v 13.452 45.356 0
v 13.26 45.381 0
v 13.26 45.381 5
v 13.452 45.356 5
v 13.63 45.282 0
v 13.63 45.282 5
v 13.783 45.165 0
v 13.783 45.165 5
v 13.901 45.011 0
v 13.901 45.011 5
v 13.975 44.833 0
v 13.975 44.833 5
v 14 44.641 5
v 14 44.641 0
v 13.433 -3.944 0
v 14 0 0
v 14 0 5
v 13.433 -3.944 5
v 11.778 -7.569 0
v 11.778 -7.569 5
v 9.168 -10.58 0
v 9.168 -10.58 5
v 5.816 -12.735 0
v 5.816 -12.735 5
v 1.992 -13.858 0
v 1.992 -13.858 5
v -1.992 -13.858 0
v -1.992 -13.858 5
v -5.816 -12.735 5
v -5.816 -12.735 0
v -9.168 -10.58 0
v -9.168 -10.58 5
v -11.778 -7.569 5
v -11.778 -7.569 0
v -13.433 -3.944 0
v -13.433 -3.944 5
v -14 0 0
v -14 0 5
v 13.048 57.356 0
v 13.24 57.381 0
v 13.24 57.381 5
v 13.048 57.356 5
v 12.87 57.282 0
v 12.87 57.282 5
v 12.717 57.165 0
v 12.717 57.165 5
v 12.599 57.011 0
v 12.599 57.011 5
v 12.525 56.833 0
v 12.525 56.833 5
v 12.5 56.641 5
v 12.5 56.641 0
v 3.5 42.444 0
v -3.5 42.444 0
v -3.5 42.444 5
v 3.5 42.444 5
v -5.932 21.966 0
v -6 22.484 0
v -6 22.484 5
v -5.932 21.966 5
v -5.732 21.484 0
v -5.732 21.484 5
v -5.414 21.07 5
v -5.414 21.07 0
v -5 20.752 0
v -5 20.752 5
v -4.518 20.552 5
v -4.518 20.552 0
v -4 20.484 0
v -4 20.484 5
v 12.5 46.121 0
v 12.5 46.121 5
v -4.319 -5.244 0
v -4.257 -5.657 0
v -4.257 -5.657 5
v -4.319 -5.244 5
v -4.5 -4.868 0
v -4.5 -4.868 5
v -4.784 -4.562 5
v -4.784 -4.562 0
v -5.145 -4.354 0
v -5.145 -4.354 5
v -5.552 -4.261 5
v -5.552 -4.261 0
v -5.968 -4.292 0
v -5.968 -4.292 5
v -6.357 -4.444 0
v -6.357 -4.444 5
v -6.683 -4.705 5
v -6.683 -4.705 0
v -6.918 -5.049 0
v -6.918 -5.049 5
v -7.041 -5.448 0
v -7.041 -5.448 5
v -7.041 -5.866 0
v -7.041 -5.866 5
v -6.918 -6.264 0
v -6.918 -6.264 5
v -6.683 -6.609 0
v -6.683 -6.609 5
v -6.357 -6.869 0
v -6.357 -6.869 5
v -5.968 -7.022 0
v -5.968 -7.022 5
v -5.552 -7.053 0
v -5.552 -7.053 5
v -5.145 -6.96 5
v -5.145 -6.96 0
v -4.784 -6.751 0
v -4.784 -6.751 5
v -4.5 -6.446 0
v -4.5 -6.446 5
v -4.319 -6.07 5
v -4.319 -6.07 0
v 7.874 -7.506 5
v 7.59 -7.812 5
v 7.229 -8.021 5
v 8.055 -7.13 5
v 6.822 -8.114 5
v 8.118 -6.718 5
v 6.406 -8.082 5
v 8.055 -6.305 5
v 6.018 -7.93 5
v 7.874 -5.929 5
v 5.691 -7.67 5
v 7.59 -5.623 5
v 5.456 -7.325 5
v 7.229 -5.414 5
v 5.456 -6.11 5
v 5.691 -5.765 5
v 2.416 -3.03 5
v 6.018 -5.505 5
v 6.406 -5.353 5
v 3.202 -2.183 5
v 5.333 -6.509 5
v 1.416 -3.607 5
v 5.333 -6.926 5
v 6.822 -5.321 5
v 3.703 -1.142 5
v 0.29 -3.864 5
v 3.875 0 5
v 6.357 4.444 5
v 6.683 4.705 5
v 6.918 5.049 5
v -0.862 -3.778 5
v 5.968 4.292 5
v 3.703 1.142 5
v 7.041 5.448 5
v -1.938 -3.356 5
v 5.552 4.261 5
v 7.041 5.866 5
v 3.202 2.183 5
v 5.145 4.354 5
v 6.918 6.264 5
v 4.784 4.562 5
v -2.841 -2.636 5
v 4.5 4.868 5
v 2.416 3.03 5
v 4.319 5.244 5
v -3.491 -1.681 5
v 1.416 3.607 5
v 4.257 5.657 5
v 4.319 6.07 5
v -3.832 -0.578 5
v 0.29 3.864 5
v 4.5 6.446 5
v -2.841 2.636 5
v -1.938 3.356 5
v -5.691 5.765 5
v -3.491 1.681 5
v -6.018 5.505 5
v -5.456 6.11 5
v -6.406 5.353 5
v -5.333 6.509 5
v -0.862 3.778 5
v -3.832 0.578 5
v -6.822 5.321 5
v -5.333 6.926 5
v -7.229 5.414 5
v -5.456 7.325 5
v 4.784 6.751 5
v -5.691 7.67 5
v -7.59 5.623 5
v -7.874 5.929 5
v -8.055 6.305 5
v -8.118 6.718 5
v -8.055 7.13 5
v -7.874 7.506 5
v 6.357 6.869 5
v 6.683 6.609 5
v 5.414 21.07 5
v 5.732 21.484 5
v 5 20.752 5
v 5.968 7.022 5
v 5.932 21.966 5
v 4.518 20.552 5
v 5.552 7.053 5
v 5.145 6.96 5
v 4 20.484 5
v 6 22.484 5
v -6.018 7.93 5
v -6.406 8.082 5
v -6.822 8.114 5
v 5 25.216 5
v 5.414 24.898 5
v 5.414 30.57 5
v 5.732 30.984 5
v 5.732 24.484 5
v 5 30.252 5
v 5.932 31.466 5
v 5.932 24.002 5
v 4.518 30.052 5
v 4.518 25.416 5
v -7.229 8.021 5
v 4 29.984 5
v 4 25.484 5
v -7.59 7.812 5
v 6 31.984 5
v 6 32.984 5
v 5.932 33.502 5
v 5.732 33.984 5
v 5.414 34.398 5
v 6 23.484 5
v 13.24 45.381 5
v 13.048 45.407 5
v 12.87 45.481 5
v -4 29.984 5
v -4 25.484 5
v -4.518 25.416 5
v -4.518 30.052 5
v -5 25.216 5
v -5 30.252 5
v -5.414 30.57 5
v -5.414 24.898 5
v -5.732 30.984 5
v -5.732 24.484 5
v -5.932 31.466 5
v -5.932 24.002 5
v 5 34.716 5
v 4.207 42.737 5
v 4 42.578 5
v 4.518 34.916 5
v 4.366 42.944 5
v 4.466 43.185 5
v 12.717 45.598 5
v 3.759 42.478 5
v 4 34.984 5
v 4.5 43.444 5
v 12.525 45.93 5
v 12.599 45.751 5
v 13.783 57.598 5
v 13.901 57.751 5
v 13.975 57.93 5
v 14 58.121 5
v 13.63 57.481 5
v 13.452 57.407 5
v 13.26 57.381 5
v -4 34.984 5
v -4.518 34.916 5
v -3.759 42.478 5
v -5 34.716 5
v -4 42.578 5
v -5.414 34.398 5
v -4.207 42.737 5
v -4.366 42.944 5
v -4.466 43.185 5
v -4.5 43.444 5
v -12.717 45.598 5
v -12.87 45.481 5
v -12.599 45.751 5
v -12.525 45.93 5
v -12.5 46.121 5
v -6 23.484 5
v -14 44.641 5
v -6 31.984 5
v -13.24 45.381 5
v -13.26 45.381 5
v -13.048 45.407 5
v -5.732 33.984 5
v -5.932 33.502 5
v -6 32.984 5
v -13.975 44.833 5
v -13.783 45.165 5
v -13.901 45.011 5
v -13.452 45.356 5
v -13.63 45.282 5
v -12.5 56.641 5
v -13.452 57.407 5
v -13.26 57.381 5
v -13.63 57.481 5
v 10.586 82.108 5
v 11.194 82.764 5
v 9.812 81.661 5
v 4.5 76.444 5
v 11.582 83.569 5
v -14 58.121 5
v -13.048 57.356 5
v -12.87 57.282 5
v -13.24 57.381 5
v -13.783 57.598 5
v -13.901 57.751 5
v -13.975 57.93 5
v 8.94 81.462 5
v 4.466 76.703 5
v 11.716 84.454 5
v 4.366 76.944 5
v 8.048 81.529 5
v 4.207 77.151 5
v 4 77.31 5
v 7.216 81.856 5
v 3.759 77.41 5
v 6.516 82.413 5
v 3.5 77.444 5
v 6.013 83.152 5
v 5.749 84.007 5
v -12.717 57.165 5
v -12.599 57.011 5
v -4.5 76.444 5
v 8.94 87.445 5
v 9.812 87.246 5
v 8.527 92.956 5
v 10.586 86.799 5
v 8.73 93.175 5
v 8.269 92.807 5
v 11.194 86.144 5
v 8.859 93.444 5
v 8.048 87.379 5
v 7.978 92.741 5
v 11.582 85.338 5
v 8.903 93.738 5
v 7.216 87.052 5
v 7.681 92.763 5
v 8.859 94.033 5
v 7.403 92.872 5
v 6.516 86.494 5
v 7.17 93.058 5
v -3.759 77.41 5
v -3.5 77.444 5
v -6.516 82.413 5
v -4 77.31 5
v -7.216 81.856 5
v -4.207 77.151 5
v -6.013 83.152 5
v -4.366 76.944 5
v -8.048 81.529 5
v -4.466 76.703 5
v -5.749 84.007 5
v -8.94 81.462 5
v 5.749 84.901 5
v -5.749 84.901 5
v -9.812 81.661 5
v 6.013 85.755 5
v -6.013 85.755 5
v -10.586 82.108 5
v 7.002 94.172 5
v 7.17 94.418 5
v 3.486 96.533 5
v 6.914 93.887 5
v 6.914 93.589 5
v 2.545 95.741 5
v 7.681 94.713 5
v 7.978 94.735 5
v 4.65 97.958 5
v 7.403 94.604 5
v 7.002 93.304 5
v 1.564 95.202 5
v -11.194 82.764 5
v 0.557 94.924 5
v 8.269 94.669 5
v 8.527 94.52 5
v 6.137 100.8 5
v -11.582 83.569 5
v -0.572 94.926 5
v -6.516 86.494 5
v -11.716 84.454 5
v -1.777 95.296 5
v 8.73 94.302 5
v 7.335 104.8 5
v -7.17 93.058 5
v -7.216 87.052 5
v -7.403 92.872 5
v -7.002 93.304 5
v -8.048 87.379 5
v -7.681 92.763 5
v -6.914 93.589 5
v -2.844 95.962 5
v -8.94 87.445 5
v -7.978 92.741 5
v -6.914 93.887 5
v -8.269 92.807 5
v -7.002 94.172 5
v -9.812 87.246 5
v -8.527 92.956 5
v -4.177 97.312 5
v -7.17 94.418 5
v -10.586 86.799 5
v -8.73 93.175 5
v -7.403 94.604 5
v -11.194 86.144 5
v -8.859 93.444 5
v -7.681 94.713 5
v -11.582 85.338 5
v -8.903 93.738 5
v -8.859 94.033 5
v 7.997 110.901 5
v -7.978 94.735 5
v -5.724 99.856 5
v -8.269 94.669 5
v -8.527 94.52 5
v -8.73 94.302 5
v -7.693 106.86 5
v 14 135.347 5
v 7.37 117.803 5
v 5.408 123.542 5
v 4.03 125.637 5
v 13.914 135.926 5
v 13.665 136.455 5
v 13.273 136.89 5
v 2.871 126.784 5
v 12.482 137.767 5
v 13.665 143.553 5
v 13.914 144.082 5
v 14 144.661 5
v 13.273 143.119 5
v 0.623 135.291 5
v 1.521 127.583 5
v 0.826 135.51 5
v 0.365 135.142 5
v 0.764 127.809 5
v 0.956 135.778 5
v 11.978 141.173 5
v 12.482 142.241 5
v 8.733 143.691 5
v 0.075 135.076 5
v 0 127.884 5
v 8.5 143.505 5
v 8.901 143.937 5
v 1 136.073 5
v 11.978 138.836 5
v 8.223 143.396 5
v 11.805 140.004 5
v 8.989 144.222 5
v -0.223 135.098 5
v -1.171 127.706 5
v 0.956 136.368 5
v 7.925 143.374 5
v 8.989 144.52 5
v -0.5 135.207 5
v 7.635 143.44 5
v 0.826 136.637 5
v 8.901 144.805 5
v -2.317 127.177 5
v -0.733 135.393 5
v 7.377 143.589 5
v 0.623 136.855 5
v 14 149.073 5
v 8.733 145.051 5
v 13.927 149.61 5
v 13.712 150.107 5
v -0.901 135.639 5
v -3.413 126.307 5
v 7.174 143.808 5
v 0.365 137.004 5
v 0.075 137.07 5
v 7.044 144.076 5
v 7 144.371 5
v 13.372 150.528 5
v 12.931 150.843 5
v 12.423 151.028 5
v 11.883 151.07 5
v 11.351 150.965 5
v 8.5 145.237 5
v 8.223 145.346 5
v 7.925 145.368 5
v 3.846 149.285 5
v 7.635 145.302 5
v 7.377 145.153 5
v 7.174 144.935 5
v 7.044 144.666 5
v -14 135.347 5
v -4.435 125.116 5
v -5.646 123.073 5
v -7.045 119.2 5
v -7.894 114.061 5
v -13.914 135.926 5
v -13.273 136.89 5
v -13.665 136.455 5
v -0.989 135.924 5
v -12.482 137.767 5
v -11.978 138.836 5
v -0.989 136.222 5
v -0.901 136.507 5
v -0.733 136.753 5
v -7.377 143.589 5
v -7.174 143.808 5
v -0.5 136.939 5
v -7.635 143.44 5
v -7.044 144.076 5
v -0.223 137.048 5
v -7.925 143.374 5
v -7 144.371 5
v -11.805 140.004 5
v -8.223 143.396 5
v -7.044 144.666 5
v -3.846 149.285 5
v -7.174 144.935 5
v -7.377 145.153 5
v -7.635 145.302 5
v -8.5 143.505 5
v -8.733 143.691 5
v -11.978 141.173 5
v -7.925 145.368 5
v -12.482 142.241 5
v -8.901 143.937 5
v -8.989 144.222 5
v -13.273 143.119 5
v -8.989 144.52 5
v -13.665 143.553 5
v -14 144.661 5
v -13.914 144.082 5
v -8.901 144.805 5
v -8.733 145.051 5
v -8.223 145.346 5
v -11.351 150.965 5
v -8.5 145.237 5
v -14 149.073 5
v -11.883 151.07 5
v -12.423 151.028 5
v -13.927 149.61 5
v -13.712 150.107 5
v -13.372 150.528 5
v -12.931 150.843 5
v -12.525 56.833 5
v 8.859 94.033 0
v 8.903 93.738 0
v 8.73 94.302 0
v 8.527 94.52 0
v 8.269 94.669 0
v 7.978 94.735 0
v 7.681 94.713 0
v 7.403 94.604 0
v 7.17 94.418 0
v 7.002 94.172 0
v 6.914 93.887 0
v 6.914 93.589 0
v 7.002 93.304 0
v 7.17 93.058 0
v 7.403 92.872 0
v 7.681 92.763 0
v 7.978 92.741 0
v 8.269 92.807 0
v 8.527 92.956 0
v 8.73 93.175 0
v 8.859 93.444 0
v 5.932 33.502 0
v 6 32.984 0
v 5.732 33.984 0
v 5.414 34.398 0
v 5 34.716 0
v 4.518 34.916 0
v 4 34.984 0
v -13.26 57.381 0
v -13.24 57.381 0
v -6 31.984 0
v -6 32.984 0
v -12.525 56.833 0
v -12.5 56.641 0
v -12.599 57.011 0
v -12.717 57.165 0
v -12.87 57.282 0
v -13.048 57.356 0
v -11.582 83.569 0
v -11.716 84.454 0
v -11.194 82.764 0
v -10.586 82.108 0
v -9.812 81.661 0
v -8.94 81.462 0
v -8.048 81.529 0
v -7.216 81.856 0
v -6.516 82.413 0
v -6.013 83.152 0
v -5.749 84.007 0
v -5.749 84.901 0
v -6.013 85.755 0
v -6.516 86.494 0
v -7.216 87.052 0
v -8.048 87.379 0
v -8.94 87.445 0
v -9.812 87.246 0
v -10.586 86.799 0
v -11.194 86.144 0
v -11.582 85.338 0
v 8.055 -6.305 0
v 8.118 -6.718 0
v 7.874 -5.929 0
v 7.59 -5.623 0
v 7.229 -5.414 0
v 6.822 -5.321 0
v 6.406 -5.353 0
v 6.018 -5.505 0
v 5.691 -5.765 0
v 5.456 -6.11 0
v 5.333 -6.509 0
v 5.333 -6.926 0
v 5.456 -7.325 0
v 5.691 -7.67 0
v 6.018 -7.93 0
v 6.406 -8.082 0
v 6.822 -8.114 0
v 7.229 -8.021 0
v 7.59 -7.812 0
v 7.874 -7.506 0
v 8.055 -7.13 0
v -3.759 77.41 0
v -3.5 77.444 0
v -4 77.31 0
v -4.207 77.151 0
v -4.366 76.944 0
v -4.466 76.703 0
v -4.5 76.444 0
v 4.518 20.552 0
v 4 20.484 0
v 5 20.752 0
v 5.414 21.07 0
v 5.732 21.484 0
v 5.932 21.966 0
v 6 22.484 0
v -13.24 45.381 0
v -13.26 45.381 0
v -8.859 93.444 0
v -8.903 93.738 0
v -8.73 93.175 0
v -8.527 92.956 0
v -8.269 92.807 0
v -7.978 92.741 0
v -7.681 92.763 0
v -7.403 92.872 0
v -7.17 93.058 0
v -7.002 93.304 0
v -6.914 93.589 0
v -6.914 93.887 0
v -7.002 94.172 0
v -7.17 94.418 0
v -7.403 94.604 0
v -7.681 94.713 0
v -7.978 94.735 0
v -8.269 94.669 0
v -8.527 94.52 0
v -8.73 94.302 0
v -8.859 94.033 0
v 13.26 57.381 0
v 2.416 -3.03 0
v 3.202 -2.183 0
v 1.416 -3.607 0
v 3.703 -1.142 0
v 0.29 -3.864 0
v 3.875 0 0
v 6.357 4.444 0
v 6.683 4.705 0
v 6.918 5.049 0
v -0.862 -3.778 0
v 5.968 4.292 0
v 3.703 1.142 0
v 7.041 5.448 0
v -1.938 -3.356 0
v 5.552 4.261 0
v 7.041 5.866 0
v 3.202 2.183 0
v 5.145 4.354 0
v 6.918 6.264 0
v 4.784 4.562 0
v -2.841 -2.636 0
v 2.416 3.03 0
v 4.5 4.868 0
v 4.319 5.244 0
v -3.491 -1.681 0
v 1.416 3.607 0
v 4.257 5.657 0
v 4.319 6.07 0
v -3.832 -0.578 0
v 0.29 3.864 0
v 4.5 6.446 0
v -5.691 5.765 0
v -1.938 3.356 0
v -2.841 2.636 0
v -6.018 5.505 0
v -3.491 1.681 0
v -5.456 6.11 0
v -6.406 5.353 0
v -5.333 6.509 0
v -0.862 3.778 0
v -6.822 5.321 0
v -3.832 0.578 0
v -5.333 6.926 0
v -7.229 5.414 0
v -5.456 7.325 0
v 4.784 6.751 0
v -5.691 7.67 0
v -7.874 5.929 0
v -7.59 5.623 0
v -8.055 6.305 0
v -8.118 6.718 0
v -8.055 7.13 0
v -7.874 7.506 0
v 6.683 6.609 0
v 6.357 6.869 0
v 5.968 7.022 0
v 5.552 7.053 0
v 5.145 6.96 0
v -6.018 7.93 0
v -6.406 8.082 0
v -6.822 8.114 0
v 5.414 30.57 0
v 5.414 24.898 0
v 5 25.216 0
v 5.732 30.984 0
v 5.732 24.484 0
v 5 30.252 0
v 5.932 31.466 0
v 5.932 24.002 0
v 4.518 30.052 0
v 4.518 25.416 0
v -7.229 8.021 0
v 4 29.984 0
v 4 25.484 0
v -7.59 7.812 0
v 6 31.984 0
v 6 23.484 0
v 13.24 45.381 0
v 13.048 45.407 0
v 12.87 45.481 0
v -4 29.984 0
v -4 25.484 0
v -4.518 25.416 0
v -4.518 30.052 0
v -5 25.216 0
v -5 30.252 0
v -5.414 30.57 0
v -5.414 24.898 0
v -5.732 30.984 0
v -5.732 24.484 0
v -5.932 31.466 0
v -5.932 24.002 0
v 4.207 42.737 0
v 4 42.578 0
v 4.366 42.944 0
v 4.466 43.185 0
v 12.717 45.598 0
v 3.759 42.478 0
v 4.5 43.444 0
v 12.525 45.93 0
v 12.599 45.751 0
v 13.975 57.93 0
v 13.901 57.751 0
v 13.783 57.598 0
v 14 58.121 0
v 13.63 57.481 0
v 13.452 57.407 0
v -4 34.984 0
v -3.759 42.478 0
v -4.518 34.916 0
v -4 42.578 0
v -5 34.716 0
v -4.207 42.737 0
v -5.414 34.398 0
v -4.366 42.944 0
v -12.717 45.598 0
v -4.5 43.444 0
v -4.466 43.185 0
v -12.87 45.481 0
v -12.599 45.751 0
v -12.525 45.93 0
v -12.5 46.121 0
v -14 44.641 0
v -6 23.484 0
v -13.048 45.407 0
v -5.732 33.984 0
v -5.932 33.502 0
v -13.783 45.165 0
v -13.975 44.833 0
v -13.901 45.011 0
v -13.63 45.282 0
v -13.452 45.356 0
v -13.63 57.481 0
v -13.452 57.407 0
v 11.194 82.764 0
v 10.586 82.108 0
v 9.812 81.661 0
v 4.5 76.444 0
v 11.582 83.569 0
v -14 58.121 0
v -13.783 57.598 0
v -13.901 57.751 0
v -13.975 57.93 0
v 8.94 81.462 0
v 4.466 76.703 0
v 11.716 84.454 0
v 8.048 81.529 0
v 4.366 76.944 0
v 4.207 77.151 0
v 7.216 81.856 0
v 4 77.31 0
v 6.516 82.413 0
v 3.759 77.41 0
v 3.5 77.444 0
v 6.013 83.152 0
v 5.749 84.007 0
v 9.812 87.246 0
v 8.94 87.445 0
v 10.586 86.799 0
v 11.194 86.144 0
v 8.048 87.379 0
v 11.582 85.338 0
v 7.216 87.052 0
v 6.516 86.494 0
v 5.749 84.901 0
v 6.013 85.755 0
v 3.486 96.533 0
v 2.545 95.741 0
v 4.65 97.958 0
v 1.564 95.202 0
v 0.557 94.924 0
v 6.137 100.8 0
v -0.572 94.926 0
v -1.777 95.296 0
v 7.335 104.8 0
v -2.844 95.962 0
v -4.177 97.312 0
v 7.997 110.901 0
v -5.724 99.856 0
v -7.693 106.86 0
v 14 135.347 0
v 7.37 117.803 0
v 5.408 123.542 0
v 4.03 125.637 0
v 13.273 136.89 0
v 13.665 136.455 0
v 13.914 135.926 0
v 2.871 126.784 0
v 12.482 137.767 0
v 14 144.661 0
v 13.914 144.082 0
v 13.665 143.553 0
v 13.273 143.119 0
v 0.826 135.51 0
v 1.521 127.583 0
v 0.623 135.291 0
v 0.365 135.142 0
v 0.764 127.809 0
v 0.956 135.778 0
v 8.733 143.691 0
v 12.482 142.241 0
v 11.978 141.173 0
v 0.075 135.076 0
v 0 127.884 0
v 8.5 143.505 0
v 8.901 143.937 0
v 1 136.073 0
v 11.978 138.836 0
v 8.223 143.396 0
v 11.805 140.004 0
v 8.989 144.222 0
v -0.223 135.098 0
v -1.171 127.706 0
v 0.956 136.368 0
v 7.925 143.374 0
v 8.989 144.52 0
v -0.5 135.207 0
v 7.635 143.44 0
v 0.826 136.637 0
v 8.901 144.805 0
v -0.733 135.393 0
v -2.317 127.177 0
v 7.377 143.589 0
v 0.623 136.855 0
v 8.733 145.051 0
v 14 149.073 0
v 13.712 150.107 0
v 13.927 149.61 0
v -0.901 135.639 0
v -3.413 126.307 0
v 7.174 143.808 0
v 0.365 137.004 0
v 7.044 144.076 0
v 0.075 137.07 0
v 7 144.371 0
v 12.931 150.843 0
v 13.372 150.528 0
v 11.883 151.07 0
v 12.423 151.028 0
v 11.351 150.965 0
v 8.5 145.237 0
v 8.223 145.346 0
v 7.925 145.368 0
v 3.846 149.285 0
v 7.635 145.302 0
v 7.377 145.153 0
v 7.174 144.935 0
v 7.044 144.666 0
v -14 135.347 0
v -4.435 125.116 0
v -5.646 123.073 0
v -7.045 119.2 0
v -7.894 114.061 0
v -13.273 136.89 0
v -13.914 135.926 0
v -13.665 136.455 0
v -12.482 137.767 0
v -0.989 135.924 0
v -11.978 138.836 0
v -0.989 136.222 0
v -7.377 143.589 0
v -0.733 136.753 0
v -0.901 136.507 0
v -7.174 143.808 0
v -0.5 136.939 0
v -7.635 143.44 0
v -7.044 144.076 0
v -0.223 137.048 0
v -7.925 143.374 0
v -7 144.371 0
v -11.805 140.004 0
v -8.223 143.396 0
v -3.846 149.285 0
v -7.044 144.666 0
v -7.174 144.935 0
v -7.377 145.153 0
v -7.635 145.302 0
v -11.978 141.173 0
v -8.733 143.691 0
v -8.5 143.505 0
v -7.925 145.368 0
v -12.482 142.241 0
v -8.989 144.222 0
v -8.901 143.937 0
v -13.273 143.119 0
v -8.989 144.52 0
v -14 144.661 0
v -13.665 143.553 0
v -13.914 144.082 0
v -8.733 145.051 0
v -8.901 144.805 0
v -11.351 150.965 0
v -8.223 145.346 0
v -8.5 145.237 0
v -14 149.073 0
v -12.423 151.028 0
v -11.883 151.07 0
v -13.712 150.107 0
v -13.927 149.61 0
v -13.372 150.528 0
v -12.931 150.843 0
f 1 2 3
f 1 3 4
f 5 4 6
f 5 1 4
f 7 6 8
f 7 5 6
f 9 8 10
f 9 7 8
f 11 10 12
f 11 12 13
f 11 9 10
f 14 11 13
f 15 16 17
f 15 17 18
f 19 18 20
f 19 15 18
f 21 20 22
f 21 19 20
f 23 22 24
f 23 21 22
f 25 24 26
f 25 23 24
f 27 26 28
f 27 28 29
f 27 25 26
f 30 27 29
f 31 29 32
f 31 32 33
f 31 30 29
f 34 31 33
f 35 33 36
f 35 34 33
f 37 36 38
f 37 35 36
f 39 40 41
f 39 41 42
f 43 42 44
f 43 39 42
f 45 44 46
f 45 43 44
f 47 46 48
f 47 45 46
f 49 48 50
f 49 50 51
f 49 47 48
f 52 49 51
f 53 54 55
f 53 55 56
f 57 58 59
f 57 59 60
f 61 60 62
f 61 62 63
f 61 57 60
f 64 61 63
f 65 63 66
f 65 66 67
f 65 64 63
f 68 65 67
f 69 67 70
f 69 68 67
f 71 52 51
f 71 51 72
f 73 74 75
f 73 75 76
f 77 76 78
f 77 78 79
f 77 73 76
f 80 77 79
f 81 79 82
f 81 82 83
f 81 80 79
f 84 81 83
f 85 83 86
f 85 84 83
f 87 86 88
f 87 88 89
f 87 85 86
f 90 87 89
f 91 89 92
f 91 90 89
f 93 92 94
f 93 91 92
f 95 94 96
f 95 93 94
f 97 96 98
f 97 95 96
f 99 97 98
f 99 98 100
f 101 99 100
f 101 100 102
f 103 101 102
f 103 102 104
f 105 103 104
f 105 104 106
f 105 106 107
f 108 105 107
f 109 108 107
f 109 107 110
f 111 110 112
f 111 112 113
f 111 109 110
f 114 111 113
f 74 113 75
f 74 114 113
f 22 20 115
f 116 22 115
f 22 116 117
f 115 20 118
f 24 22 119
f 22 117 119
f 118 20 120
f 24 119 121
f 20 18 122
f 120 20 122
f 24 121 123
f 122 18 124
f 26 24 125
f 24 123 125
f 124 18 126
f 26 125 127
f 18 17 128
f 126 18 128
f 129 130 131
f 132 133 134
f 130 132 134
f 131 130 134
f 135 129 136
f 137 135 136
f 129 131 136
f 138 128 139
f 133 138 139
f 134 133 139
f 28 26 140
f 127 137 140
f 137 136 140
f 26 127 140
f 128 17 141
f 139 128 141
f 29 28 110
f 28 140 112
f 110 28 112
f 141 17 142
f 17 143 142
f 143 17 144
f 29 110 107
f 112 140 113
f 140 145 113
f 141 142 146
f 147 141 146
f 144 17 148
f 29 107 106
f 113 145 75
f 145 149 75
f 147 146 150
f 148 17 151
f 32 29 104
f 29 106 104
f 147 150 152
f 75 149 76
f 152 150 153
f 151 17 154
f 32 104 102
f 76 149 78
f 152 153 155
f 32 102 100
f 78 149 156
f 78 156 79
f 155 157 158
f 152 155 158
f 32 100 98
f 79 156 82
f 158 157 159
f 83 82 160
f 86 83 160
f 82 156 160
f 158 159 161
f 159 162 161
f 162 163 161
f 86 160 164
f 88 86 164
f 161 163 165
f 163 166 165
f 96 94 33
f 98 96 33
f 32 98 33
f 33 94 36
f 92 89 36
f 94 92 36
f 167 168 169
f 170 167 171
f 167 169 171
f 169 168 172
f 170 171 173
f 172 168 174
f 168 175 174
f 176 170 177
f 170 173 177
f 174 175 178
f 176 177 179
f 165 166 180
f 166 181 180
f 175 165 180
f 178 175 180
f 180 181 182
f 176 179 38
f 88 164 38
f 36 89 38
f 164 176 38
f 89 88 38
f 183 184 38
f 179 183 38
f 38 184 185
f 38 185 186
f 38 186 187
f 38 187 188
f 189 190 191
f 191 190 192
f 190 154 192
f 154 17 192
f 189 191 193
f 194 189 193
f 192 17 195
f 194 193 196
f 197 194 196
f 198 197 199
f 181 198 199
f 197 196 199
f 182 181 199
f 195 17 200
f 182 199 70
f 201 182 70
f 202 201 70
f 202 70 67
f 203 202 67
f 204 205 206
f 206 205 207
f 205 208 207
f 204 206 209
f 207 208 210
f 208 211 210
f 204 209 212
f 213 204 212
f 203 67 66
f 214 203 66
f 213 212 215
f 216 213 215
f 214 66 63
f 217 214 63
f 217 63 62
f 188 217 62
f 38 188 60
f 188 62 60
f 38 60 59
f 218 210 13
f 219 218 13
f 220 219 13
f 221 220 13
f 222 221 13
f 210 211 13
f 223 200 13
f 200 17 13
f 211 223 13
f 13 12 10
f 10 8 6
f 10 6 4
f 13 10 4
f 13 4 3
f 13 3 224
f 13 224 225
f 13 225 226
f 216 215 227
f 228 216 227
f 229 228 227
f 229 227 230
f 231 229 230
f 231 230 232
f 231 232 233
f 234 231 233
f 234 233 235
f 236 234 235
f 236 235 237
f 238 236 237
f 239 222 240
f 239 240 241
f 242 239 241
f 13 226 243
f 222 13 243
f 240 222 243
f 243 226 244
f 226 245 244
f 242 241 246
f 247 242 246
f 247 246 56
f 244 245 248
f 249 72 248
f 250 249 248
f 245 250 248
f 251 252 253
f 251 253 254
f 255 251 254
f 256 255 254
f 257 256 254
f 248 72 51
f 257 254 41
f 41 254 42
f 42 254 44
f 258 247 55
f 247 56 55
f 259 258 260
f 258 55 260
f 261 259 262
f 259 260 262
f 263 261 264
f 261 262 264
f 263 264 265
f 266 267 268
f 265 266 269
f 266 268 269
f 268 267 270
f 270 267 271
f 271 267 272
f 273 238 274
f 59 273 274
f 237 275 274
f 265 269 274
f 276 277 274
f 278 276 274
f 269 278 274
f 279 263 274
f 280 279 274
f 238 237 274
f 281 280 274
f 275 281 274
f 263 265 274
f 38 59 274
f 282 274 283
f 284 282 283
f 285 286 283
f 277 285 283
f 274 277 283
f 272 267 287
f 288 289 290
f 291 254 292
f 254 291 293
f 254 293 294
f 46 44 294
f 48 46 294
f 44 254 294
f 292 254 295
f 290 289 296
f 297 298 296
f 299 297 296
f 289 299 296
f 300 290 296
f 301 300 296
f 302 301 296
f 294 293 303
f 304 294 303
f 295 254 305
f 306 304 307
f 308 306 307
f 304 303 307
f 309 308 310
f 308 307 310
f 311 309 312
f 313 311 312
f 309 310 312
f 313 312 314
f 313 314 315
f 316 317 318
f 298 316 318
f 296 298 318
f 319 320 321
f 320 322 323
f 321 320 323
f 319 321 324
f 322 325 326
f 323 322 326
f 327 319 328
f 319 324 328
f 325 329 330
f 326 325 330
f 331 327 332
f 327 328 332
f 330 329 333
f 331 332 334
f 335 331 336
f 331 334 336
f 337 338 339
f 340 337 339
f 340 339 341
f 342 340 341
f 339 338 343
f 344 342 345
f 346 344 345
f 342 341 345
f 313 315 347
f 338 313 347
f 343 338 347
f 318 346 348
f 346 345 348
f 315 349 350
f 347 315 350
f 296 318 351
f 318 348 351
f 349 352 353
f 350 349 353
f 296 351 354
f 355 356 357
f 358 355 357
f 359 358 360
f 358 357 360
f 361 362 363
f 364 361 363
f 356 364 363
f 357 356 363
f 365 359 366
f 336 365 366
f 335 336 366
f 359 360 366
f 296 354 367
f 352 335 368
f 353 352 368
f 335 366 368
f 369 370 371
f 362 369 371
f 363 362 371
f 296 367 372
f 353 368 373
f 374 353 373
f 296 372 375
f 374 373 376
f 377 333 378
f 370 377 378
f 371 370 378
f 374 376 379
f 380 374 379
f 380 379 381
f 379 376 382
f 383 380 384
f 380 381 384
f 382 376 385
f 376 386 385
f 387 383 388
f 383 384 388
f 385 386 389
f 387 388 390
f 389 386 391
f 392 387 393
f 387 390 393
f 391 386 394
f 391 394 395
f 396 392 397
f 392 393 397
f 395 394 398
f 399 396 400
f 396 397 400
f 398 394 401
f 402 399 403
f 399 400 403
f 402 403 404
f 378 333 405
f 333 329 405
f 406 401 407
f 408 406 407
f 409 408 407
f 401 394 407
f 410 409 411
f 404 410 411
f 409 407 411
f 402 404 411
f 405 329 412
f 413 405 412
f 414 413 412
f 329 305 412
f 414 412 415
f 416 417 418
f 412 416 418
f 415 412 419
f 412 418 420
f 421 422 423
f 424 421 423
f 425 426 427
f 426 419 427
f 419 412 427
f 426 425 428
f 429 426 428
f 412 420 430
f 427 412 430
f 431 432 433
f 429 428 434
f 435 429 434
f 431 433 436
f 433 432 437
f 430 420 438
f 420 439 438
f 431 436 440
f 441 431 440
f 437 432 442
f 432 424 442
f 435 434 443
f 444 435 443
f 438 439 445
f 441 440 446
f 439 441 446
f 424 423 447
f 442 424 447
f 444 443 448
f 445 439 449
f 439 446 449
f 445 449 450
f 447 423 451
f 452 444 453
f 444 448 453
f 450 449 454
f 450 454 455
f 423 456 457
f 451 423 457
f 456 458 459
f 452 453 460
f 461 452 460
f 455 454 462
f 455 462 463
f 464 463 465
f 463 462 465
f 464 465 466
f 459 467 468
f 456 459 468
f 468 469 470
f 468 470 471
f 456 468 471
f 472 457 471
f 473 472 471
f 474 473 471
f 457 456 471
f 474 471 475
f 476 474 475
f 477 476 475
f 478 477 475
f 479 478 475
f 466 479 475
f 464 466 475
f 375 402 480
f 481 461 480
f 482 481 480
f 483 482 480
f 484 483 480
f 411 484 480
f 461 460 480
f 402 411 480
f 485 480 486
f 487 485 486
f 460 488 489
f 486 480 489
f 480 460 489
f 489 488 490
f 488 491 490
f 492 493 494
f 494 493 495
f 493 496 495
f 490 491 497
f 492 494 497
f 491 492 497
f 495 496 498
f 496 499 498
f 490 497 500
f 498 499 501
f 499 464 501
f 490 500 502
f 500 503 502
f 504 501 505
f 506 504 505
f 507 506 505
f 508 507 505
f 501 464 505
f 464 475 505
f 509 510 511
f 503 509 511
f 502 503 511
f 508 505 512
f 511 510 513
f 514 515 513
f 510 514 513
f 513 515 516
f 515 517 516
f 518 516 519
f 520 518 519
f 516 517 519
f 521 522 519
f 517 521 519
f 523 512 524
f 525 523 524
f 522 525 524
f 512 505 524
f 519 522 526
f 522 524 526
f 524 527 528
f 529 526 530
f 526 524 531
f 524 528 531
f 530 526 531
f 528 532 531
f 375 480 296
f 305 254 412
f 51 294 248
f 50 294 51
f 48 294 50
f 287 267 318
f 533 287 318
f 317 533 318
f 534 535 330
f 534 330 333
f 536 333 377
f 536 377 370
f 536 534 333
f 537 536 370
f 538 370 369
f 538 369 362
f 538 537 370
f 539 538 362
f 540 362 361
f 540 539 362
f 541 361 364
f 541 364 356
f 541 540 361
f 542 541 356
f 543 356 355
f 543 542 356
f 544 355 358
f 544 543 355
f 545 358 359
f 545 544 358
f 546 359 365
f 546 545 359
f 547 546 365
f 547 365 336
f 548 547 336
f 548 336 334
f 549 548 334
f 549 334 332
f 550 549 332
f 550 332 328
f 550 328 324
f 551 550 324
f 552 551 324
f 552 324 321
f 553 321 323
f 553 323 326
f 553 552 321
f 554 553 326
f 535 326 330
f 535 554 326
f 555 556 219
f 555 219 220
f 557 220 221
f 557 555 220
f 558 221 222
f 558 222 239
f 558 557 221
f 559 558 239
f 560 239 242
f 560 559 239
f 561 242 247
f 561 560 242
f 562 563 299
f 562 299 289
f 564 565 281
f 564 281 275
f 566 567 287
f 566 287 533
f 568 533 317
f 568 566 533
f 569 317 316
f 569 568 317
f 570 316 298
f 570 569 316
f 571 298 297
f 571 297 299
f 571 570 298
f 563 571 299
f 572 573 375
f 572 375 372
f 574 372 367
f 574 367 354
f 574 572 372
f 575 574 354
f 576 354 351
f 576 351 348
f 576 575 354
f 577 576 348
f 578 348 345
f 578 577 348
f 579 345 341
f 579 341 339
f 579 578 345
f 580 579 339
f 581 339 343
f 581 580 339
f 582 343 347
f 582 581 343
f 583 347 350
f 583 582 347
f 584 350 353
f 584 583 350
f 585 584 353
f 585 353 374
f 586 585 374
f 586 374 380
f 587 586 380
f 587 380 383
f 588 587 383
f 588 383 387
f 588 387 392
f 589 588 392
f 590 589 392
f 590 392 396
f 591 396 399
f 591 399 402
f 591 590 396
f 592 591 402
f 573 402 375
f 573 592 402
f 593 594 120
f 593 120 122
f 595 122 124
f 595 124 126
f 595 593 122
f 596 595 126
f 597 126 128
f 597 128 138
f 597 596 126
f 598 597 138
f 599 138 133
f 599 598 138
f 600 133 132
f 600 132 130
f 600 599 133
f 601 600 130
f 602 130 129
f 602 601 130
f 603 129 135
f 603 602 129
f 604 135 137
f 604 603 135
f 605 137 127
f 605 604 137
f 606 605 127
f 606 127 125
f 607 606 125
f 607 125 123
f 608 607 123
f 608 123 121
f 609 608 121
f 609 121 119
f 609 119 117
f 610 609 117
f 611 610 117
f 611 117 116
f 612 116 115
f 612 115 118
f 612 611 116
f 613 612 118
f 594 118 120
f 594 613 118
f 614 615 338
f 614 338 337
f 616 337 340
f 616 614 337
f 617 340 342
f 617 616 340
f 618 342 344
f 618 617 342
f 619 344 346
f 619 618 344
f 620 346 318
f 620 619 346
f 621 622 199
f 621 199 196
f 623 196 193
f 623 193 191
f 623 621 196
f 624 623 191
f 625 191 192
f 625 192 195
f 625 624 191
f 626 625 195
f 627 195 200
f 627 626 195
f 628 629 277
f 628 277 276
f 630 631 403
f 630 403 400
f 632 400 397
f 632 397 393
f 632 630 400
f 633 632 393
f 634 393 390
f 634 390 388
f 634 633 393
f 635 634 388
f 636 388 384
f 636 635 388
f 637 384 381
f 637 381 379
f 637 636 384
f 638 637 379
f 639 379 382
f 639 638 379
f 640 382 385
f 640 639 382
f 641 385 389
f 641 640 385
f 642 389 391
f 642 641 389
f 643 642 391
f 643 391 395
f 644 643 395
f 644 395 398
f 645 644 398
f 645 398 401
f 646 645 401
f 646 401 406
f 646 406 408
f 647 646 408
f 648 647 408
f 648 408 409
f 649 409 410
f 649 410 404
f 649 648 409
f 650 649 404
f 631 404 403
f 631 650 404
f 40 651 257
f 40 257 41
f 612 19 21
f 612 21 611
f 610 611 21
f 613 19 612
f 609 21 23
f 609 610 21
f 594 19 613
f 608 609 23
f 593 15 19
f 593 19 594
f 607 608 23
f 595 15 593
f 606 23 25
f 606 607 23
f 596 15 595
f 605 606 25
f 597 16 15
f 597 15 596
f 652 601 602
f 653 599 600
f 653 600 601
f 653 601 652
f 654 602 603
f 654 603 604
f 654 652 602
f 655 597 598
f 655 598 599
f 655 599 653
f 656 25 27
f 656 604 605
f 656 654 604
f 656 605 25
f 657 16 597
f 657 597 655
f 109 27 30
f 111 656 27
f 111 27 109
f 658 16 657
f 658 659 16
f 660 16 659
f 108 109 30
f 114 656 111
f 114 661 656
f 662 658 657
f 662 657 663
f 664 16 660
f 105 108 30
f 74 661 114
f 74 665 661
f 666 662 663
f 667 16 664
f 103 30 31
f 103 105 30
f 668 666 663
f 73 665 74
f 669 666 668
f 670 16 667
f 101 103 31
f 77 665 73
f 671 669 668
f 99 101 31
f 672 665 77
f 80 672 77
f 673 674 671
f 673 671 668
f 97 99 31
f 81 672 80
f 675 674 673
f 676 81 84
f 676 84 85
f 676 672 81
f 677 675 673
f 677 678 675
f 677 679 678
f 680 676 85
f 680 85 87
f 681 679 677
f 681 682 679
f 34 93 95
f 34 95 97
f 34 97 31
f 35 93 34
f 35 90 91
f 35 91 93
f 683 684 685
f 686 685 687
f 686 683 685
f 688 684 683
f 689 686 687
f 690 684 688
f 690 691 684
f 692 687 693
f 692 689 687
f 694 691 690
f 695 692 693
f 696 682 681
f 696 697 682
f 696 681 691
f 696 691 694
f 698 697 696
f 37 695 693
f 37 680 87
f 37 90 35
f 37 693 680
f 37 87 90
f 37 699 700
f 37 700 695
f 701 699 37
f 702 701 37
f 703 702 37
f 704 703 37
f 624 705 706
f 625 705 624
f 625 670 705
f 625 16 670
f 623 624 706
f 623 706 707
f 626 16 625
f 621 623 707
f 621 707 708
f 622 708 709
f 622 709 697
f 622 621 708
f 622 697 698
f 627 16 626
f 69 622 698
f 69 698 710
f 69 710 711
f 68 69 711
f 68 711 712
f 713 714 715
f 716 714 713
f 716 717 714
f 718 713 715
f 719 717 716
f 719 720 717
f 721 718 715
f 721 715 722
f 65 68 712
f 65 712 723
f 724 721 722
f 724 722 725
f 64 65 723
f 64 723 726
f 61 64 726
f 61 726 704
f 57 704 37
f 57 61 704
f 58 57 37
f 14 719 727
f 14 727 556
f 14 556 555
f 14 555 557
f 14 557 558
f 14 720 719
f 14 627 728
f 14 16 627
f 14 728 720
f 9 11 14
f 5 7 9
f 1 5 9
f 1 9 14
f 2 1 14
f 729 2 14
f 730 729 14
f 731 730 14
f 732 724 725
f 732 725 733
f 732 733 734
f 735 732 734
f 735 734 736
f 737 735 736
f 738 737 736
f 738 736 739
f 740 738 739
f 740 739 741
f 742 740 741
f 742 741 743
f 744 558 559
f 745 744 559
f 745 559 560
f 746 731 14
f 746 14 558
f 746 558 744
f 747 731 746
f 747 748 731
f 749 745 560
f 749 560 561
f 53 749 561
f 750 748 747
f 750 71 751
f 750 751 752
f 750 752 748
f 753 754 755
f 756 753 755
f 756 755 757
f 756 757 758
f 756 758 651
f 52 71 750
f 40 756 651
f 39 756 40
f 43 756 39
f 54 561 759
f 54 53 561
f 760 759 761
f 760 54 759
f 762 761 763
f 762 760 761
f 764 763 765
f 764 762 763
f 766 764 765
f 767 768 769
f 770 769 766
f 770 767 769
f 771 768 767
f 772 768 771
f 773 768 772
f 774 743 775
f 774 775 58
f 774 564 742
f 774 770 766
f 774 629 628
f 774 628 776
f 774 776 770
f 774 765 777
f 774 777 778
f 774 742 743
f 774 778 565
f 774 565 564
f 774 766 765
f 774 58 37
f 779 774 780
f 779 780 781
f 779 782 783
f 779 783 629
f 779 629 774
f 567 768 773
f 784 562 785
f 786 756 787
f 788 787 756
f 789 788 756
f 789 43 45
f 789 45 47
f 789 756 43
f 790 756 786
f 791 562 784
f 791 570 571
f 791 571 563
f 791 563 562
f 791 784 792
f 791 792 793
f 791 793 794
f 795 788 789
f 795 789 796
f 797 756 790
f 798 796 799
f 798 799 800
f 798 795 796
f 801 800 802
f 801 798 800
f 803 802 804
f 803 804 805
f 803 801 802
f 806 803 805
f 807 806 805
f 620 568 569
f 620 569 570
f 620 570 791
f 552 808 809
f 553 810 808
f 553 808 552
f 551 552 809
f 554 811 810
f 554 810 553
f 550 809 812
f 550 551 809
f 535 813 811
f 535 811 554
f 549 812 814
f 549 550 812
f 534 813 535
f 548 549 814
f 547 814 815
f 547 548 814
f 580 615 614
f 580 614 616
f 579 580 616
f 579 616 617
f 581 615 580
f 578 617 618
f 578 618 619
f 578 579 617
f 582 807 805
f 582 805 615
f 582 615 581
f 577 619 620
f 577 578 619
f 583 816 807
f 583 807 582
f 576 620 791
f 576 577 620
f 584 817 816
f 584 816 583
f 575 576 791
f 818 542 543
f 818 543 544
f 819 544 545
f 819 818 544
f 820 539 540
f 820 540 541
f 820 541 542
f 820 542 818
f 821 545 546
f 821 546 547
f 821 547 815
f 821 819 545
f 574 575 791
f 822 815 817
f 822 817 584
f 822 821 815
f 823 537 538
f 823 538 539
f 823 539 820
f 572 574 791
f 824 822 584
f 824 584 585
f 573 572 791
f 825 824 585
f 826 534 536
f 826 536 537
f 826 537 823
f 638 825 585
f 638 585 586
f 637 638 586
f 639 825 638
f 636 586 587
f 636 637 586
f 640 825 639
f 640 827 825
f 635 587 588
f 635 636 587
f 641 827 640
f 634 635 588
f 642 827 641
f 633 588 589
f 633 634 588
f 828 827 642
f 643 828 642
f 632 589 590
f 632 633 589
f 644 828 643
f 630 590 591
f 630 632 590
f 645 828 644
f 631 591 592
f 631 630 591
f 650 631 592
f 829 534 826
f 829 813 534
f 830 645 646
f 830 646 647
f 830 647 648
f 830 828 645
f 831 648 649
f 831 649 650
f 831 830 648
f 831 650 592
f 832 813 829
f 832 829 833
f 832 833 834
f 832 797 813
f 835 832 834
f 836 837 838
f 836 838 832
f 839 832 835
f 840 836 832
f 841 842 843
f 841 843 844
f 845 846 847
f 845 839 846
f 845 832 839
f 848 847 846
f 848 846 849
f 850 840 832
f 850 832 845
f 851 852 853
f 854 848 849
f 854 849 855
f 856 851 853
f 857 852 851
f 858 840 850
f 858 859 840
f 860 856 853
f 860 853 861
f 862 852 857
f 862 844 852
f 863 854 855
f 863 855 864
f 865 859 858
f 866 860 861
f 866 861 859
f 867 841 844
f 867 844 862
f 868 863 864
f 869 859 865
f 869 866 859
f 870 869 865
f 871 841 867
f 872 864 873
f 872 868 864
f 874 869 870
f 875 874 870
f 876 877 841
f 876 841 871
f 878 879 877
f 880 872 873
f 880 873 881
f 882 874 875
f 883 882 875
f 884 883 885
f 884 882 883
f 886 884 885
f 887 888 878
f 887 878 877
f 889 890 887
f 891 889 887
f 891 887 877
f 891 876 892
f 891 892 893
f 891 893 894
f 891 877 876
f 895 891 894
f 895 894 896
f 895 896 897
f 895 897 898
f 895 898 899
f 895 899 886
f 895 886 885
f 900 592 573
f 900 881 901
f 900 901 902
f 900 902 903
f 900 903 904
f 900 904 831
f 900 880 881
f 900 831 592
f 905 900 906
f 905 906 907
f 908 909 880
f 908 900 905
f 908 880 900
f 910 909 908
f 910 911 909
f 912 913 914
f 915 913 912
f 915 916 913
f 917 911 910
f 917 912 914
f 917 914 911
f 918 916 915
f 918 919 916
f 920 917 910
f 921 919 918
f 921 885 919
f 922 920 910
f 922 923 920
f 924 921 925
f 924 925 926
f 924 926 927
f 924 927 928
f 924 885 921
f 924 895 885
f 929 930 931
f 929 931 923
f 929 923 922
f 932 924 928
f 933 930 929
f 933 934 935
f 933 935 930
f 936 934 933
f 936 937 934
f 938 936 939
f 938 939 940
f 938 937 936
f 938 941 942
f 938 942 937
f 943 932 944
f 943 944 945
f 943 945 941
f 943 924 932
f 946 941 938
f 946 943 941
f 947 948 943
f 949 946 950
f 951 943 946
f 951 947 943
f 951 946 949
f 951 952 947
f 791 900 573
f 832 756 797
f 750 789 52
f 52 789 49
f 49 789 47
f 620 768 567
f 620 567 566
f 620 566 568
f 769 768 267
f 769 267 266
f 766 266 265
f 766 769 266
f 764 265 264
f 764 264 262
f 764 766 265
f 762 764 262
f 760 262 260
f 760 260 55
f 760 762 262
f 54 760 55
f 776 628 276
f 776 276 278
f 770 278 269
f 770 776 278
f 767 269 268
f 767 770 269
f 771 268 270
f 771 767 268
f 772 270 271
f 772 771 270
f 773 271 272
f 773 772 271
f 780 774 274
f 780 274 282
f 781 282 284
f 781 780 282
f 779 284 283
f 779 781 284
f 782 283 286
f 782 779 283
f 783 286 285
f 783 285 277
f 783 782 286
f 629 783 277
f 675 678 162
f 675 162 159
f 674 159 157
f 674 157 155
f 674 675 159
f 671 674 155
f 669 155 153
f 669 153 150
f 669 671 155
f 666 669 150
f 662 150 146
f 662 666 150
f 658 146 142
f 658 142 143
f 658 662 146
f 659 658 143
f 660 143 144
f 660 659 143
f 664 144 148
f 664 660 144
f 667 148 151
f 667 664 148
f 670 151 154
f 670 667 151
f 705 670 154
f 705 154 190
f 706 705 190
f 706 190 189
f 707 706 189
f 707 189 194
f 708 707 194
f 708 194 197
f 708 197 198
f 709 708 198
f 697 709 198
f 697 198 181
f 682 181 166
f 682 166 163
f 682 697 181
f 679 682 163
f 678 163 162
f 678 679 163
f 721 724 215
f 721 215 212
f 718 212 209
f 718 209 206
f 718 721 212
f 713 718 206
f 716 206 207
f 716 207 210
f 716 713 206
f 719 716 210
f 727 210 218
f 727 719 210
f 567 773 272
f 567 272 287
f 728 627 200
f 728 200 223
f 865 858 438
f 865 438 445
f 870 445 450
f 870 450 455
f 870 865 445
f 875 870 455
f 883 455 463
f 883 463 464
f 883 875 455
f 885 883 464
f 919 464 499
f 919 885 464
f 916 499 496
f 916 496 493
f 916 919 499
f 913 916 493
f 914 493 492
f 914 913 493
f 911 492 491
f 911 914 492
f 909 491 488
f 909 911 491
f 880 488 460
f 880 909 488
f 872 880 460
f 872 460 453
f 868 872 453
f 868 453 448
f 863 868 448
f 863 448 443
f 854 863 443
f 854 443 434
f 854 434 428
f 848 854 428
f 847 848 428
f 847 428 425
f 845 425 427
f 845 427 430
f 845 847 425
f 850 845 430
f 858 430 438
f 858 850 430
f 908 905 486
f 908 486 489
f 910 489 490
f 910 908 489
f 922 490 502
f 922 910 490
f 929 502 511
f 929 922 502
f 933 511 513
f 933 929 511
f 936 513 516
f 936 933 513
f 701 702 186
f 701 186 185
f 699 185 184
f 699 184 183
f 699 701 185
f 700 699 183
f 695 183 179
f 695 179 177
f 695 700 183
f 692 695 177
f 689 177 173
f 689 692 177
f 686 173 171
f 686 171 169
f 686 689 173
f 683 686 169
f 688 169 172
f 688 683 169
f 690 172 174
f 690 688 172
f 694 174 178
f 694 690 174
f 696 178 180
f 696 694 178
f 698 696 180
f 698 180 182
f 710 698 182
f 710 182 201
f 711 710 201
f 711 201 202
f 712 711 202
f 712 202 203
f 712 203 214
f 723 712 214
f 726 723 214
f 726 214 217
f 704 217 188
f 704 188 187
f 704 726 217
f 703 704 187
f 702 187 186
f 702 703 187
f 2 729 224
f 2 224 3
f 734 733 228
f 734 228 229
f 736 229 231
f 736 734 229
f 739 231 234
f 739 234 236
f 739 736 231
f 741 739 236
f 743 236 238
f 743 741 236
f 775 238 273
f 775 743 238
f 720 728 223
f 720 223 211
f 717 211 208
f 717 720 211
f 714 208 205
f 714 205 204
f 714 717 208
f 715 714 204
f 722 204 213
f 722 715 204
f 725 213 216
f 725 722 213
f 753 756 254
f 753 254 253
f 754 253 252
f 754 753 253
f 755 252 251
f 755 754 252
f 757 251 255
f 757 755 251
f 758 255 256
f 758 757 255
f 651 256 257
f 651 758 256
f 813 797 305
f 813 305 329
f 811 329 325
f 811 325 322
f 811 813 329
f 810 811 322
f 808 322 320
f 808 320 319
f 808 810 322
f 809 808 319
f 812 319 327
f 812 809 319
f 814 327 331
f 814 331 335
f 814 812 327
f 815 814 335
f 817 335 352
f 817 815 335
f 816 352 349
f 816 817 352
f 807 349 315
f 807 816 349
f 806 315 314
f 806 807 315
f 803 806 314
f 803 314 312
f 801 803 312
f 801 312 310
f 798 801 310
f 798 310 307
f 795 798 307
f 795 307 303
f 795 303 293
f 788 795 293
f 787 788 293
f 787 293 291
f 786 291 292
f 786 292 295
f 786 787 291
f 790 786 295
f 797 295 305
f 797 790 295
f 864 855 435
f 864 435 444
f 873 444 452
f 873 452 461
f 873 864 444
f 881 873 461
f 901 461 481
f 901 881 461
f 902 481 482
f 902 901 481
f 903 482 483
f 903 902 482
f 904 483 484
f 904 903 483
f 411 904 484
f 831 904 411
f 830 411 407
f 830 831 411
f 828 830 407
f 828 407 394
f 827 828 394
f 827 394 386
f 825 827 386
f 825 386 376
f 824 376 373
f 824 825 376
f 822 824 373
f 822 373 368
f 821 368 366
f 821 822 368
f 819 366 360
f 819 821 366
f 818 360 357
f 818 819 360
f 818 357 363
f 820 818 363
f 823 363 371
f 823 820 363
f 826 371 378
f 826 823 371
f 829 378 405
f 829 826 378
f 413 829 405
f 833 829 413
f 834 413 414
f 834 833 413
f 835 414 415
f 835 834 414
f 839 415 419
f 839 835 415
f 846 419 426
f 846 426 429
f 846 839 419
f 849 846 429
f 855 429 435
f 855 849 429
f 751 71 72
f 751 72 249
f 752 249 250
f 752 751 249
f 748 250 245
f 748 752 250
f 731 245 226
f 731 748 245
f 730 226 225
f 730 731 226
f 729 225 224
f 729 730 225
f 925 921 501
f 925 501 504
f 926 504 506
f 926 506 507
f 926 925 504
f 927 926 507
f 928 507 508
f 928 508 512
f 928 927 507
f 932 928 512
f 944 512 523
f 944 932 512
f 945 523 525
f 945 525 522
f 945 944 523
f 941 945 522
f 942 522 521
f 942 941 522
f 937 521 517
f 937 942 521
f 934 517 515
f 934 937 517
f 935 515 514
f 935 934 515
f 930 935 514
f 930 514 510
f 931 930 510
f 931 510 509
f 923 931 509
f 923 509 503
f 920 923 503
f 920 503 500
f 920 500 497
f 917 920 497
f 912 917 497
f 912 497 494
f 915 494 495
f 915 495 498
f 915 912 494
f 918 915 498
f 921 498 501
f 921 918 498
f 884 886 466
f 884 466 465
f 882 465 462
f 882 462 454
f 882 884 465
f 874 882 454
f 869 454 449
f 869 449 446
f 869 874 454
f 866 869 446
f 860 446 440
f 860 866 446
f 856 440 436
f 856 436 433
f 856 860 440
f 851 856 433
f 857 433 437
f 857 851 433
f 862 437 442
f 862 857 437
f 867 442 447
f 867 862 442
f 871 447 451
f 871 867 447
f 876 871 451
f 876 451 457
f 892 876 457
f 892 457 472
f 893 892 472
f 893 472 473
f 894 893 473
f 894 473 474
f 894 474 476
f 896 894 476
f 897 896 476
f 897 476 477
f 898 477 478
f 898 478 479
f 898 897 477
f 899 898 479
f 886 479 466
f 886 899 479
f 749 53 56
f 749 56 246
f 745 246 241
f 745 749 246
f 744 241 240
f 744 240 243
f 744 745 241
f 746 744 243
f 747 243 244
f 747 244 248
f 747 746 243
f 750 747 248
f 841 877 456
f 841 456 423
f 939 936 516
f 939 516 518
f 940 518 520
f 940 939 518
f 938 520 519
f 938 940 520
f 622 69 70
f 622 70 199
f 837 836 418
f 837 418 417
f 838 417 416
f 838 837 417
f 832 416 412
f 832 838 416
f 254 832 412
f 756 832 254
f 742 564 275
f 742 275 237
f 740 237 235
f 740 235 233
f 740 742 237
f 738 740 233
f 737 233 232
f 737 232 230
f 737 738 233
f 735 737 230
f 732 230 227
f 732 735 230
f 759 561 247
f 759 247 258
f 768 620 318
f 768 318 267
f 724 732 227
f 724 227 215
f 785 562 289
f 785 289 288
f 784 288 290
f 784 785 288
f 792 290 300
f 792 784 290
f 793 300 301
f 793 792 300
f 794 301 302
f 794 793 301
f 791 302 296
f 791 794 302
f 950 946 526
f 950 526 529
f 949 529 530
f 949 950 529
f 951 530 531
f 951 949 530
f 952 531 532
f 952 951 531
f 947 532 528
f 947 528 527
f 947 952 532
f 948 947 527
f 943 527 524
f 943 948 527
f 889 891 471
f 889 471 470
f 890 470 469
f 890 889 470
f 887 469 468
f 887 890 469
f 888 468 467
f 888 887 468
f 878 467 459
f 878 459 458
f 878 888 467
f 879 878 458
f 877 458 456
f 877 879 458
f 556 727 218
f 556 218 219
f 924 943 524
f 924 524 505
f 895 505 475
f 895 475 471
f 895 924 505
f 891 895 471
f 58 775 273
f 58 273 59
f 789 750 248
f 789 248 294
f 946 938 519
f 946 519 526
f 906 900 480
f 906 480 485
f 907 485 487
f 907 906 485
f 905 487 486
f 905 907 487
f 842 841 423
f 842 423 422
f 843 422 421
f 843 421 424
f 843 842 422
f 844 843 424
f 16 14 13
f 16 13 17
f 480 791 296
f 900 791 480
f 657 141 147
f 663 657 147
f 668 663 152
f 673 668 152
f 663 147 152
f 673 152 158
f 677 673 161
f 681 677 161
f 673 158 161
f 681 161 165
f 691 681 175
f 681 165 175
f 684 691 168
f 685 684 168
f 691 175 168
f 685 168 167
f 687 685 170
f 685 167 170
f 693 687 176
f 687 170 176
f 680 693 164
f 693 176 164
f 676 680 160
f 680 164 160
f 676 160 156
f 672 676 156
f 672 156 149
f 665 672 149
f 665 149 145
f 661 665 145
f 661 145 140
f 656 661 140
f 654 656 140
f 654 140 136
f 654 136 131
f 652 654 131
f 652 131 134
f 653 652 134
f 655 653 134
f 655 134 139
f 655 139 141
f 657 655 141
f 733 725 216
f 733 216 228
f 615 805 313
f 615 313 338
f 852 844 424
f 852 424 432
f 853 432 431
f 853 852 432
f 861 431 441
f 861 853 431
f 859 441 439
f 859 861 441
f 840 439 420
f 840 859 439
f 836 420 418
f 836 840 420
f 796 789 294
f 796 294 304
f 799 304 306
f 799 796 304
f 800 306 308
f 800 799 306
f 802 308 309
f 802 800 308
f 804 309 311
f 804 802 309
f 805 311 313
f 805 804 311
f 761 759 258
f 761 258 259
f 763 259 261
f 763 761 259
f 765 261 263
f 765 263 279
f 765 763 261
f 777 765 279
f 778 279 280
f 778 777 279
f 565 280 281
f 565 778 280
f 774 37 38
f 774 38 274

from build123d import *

# Parameters (mm, degrees)
SKETCH1_R           = 1
SKETCH1_R_2         = 1.4
SKETCH1_R_3         = 3
SKETCH1_RX          = 16.5
SKETCH1_RY          = 8
BOSS_EXTRUDE1_DEPTH = 5
CUT_EXTRUDE1_REACH  = 153.803
SKETCH2_R           = 3.875


with BuildPart() as part:
    # Sketch1 → Boss-Extrude1 (new body)
    with BuildSketch(Plane.XY):
        with BuildLine():
            Line((-14, 0), (-14, 44.641437436))
            ThreePointArc((-14, 44.641437436), (-13.783259018, 45.164696454), (-13.26, 45.381437436))
            Line((-13.26, 45.381437436), (-13.24, 45.381437436))
            ThreePointArc((-13.24, 45.381437436), (-12.716740982, 45.598178417), (-12.5, 46.121437436))
            Line((-12.5, 46.121437436), (-12.5, 56.641437436))
            ThreePointArc((-12.5, 56.641437436), (-12.716740982, 57.164696454), (-13.24, 57.381437436))
            Line((-13.24, 57.381437436), (-13.26, 57.381437436))
            ThreePointArc((-13.26, 57.381437436), (-13.783259018, 57.598178417), (-14, 58.121437436))
            Line((-14, 58.121437436), (-14, 135.347392982))
            ThreePointArc((-14, 135.347392982), (-13.809166738, 136.199986504), (-13.273084285, 136.889876824))
            ThreePointArc((-13.273084285, 136.889876824), (-11.805402668, 140.00423401), (-13.273084285, 143.118591196))
            ThreePointArc((-13.273084285, 143.118591196), (-13.809166738, 143.808481515), (-14, 144.661075038))
            Line((-14, 144.661075038), (-14, 149.07320666))
            ThreePointArc((-14, 149.07320666), (-13.162476387, 150.700673602), (-11.351351351, 150.965098552))
            ThreePointArc((-11.351351351, 150.965098552), (0, 149.07320666), (11.351351351, 150.965098552))
            ThreePointArc((11.351351351, 150.965098552), (13.162476387, 150.700673602), (14, 149.07320666))
            Line((14, 149.07320666), (14, 144.661075038))
            ThreePointArc((14, 144.661075038), (13.809166738, 143.808481515), (13.273084285, 143.118591196))
            ThreePointArc((13.273084285, 143.118591196), (11.805402668, 140.00423401), (13.273084285, 136.889876824))
            ThreePointArc((13.273084285, 136.889876824), (13.809166738, 136.199986504), (14, 135.347392982))
            Line((14, 135.347392982), (14, 58.121437436))
            ThreePointArc((14, 58.121437436), (13.783259018, 57.598178417), (13.26, 57.381437436))
            Line((13.26, 57.381437436), (13.24, 57.381437436))
            ThreePointArc((13.24, 57.381437436), (12.716740982, 57.164696454), (12.5, 56.641437436))
            Line((12.5, 56.641437436), (12.5, 46.121437436))
            ThreePointArc((12.5, 46.121437436), (12.716740982, 45.598178417), (13.24, 45.381437436))
            Line((13.24, 45.381437436), (13.26, 45.381437436))
            ThreePointArc((13.26, 45.381437436), (13.783259018, 45.164696454), (14, 44.641437436))
            Line((14, 44.641437436), (14, 0))
            ThreePointArc((14, 0), (0, -14), (-14, 0))
        make_face()
        with Locations((-8, 144.371191598)):
            Circle(SKETCH1_R, mode=Mode.SUBTRACT)
        with Locations((6.717514421, -6.717514421)):
            Circle(SKETCH1_R_2, mode=Mode.SUBTRACT)
        with Locations((-5.656854249, -5.656854249)):
            Circle(SKETCH1_R_2, mode=Mode.SUBTRACT)
        with Locations(Location((5.656854249, 5.656854249, 0), (0, 0, 180))):
            Circle(SKETCH1_R_2, mode=Mode.SUBTRACT)
        with Locations(Location((-6.717514421, 6.717514421, 0), (0, 0, 180))):
            Circle(SKETCH1_R_2, mode=Mode.SUBTRACT)
        with Locations(Location((8, 144.371191598, 0), (0, 0, 180))):
            Circle(SKETCH1_R, mode=Mode.SUBTRACT)
        with Locations((0, 136.07320666)):
            Circle(SKETCH1_R, mode=Mode.SUBTRACT)
        with Locations((7.903282752, 93.738271437)):
            Circle(SKETCH1_R, mode=Mode.SUBTRACT)
        with Locations((8.715574275, 84.453736851)):
            Circle(SKETCH1_R_3, mode=Mode.SUBTRACT)
        with Locations(Location((-7.903282752, 93.738271437, 0), (0, 0, 180))):
            Circle(SKETCH1_R, mode=Mode.SUBTRACT)
        with Locations(Location((-8.715574275, 84.453736851, 0), (0, 0, 180))):
            Circle(SKETCH1_R_3, mode=Mode.SUBTRACT)
        with Locations(Location((0, 111.383897204), (0, 0, 90))):
            Ellipse(SKETCH1_RX, SKETCH1_RY, mode=Mode.SUBTRACT)
        with BuildLine():
            Line((-4, 29.983897204), (4, 29.983897204))
            ThreePointArc((4, 29.983897204), (5.414213562, 30.569683642), (6, 31.983897204))
            Line((6, 31.983897204), (6, 32.983897204))
            ThreePointArc((6, 32.983897204), (5.414213562, 34.398110767), (4, 34.983897204))
            Line((4, 34.983897204), (-4, 34.983897204))
            ThreePointArc((-4, 34.983897204), (-5.414213562, 34.398110767), (-6, 32.983897204))
            Line((-6, 32.983897204), (-6, 31.983897204))
            ThreePointArc((-6, 31.983897204), (-5.414213562, 30.569683642), (-4, 29.983897204))
        make_face(mode=Mode.SUBTRACT)
        with BuildLine():
            Line((-4, 20.483897204), (4, 20.483897204))
            ThreePointArc((4, 20.483897204), (5.414213562, 21.069683642), (6, 22.483897204))
            Line((6, 22.483897204), (6, 23.483897204))
            ThreePointArc((6, 23.483897204), (5.414213562, 24.898110767), (4, 25.483897204))
            Line((4, 25.483897204), (-4, 25.483897204))
            ThreePointArc((-4, 25.483897204), (-5.414213562, 24.898110767), (-6, 23.483897204))
            Line((-6, 23.483897204), (-6, 22.483897204))
            ThreePointArc((-6, 22.483897204), (-5.414213562, 21.069683642), (-4, 20.483897204))
        make_face(mode=Mode.SUBTRACT)
        with BuildLine():
            Line((-3.5, 42.443937436), (3.5, 42.443937436))
            ThreePointArc((3.5, 42.443937436), (4.207106781, 42.736830654), (4.5, 43.443937436))
            Line((4.5, 43.443937436), (4.5, 76.443937436))
            ThreePointArc((4.5, 76.443937436), (4.207106781, 77.151044217), (3.5, 77.443937436))
            Line((3.5, 77.443937436), (-3.5, 77.443937436))
            ThreePointArc((-3.5, 77.443937436), (-4.207106781, 77.151044217), (-4.5, 76.443937436))
            Line((-4.5, 76.443937436), (-4.5, 43.443937436))
            ThreePointArc((-4.5, 43.443937436), (-4.207106781, 42.736830654), (-3.5, 42.443937436))
        make_face(mode=Mode.SUBTRACT)
    extrude(amount=BOSS_EXTRUDE1_DEPTH)

    # Sketch2 → Cut-Extrude1 (cut, up to next)
    with BuildSketch(Plane.XY.offset(5), mode=Mode.PRIVATE) as cut_extrude1_sk1:
        Circle(SKETCH2_R)
    cut_extrude1_tool1 = extrude(cut_extrude1_sk1.sketch, amount=-CUT_EXTRUDE1_REACH, mode=Mode.PRIVATE) & part.part
    add(cut_extrude1_tool1.solids().sort_by_distance((0, 0, 5))[0], mode=Mode.SUBTRACT)


solid = part.part
